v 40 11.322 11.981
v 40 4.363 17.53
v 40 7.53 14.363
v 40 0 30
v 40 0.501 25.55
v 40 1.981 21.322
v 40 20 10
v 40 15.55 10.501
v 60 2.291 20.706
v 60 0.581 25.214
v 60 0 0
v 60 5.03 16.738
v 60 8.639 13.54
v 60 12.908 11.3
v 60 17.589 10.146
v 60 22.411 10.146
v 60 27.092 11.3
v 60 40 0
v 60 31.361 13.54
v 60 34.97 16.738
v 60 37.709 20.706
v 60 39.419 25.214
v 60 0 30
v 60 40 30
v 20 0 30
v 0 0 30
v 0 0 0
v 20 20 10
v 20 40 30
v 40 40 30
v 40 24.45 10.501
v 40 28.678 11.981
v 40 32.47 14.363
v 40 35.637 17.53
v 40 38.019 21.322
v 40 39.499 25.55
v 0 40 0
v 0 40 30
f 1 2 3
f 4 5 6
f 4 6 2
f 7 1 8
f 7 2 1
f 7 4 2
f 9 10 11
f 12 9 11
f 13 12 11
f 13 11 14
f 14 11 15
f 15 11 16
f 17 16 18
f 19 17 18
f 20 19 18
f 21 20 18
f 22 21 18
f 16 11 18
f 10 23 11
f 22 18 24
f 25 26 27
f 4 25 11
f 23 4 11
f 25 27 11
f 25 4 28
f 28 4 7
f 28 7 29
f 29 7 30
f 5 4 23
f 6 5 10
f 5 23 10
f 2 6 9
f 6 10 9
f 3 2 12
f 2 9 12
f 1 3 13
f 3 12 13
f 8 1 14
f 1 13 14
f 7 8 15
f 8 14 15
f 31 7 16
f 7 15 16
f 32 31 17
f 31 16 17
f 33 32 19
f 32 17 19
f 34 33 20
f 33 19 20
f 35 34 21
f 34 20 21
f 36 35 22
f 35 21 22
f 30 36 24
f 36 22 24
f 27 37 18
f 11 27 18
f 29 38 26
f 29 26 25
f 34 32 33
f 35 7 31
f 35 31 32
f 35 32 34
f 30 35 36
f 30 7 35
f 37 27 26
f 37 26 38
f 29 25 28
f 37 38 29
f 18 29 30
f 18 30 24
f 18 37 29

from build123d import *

# Parameters (mm, degrees)
F0_W     = 60
F0_H     = 40
F1_DEPTH = 30
F3_DEPTH = 20
F5_DEPTH = 20


with BuildPart() as f1:
    # F0 (on Top) → F1 (new body)
    with BuildSketch(Plane.XY):
        with Locations((30, 20)):
            Rectangle(F0_W, F0_H)
    extrude(amount=F1_DEPTH)

    # F2 (on face) → F3 (cut)
    with BuildSketch(Plane.YZ.offset(60)):
        with BuildLine():
            Line((40, 30), (0, 30))
            ThreePointArc((0, 30), (20, 10), (40, 30))
        make_face()
    extrude(amount=-F3_DEPTH, mode=Mode.SUBTRACT)

    # F4 (on face) → F5 (cut)
    with BuildSketch(Plane.YZ.offset(40)):
        Polygon((40, 30), (0, 30), (20, 10), align=None)
    extrude(amount=-F5_DEPTH, mode=Mode.SUBTRACT)


solid = f1.part
